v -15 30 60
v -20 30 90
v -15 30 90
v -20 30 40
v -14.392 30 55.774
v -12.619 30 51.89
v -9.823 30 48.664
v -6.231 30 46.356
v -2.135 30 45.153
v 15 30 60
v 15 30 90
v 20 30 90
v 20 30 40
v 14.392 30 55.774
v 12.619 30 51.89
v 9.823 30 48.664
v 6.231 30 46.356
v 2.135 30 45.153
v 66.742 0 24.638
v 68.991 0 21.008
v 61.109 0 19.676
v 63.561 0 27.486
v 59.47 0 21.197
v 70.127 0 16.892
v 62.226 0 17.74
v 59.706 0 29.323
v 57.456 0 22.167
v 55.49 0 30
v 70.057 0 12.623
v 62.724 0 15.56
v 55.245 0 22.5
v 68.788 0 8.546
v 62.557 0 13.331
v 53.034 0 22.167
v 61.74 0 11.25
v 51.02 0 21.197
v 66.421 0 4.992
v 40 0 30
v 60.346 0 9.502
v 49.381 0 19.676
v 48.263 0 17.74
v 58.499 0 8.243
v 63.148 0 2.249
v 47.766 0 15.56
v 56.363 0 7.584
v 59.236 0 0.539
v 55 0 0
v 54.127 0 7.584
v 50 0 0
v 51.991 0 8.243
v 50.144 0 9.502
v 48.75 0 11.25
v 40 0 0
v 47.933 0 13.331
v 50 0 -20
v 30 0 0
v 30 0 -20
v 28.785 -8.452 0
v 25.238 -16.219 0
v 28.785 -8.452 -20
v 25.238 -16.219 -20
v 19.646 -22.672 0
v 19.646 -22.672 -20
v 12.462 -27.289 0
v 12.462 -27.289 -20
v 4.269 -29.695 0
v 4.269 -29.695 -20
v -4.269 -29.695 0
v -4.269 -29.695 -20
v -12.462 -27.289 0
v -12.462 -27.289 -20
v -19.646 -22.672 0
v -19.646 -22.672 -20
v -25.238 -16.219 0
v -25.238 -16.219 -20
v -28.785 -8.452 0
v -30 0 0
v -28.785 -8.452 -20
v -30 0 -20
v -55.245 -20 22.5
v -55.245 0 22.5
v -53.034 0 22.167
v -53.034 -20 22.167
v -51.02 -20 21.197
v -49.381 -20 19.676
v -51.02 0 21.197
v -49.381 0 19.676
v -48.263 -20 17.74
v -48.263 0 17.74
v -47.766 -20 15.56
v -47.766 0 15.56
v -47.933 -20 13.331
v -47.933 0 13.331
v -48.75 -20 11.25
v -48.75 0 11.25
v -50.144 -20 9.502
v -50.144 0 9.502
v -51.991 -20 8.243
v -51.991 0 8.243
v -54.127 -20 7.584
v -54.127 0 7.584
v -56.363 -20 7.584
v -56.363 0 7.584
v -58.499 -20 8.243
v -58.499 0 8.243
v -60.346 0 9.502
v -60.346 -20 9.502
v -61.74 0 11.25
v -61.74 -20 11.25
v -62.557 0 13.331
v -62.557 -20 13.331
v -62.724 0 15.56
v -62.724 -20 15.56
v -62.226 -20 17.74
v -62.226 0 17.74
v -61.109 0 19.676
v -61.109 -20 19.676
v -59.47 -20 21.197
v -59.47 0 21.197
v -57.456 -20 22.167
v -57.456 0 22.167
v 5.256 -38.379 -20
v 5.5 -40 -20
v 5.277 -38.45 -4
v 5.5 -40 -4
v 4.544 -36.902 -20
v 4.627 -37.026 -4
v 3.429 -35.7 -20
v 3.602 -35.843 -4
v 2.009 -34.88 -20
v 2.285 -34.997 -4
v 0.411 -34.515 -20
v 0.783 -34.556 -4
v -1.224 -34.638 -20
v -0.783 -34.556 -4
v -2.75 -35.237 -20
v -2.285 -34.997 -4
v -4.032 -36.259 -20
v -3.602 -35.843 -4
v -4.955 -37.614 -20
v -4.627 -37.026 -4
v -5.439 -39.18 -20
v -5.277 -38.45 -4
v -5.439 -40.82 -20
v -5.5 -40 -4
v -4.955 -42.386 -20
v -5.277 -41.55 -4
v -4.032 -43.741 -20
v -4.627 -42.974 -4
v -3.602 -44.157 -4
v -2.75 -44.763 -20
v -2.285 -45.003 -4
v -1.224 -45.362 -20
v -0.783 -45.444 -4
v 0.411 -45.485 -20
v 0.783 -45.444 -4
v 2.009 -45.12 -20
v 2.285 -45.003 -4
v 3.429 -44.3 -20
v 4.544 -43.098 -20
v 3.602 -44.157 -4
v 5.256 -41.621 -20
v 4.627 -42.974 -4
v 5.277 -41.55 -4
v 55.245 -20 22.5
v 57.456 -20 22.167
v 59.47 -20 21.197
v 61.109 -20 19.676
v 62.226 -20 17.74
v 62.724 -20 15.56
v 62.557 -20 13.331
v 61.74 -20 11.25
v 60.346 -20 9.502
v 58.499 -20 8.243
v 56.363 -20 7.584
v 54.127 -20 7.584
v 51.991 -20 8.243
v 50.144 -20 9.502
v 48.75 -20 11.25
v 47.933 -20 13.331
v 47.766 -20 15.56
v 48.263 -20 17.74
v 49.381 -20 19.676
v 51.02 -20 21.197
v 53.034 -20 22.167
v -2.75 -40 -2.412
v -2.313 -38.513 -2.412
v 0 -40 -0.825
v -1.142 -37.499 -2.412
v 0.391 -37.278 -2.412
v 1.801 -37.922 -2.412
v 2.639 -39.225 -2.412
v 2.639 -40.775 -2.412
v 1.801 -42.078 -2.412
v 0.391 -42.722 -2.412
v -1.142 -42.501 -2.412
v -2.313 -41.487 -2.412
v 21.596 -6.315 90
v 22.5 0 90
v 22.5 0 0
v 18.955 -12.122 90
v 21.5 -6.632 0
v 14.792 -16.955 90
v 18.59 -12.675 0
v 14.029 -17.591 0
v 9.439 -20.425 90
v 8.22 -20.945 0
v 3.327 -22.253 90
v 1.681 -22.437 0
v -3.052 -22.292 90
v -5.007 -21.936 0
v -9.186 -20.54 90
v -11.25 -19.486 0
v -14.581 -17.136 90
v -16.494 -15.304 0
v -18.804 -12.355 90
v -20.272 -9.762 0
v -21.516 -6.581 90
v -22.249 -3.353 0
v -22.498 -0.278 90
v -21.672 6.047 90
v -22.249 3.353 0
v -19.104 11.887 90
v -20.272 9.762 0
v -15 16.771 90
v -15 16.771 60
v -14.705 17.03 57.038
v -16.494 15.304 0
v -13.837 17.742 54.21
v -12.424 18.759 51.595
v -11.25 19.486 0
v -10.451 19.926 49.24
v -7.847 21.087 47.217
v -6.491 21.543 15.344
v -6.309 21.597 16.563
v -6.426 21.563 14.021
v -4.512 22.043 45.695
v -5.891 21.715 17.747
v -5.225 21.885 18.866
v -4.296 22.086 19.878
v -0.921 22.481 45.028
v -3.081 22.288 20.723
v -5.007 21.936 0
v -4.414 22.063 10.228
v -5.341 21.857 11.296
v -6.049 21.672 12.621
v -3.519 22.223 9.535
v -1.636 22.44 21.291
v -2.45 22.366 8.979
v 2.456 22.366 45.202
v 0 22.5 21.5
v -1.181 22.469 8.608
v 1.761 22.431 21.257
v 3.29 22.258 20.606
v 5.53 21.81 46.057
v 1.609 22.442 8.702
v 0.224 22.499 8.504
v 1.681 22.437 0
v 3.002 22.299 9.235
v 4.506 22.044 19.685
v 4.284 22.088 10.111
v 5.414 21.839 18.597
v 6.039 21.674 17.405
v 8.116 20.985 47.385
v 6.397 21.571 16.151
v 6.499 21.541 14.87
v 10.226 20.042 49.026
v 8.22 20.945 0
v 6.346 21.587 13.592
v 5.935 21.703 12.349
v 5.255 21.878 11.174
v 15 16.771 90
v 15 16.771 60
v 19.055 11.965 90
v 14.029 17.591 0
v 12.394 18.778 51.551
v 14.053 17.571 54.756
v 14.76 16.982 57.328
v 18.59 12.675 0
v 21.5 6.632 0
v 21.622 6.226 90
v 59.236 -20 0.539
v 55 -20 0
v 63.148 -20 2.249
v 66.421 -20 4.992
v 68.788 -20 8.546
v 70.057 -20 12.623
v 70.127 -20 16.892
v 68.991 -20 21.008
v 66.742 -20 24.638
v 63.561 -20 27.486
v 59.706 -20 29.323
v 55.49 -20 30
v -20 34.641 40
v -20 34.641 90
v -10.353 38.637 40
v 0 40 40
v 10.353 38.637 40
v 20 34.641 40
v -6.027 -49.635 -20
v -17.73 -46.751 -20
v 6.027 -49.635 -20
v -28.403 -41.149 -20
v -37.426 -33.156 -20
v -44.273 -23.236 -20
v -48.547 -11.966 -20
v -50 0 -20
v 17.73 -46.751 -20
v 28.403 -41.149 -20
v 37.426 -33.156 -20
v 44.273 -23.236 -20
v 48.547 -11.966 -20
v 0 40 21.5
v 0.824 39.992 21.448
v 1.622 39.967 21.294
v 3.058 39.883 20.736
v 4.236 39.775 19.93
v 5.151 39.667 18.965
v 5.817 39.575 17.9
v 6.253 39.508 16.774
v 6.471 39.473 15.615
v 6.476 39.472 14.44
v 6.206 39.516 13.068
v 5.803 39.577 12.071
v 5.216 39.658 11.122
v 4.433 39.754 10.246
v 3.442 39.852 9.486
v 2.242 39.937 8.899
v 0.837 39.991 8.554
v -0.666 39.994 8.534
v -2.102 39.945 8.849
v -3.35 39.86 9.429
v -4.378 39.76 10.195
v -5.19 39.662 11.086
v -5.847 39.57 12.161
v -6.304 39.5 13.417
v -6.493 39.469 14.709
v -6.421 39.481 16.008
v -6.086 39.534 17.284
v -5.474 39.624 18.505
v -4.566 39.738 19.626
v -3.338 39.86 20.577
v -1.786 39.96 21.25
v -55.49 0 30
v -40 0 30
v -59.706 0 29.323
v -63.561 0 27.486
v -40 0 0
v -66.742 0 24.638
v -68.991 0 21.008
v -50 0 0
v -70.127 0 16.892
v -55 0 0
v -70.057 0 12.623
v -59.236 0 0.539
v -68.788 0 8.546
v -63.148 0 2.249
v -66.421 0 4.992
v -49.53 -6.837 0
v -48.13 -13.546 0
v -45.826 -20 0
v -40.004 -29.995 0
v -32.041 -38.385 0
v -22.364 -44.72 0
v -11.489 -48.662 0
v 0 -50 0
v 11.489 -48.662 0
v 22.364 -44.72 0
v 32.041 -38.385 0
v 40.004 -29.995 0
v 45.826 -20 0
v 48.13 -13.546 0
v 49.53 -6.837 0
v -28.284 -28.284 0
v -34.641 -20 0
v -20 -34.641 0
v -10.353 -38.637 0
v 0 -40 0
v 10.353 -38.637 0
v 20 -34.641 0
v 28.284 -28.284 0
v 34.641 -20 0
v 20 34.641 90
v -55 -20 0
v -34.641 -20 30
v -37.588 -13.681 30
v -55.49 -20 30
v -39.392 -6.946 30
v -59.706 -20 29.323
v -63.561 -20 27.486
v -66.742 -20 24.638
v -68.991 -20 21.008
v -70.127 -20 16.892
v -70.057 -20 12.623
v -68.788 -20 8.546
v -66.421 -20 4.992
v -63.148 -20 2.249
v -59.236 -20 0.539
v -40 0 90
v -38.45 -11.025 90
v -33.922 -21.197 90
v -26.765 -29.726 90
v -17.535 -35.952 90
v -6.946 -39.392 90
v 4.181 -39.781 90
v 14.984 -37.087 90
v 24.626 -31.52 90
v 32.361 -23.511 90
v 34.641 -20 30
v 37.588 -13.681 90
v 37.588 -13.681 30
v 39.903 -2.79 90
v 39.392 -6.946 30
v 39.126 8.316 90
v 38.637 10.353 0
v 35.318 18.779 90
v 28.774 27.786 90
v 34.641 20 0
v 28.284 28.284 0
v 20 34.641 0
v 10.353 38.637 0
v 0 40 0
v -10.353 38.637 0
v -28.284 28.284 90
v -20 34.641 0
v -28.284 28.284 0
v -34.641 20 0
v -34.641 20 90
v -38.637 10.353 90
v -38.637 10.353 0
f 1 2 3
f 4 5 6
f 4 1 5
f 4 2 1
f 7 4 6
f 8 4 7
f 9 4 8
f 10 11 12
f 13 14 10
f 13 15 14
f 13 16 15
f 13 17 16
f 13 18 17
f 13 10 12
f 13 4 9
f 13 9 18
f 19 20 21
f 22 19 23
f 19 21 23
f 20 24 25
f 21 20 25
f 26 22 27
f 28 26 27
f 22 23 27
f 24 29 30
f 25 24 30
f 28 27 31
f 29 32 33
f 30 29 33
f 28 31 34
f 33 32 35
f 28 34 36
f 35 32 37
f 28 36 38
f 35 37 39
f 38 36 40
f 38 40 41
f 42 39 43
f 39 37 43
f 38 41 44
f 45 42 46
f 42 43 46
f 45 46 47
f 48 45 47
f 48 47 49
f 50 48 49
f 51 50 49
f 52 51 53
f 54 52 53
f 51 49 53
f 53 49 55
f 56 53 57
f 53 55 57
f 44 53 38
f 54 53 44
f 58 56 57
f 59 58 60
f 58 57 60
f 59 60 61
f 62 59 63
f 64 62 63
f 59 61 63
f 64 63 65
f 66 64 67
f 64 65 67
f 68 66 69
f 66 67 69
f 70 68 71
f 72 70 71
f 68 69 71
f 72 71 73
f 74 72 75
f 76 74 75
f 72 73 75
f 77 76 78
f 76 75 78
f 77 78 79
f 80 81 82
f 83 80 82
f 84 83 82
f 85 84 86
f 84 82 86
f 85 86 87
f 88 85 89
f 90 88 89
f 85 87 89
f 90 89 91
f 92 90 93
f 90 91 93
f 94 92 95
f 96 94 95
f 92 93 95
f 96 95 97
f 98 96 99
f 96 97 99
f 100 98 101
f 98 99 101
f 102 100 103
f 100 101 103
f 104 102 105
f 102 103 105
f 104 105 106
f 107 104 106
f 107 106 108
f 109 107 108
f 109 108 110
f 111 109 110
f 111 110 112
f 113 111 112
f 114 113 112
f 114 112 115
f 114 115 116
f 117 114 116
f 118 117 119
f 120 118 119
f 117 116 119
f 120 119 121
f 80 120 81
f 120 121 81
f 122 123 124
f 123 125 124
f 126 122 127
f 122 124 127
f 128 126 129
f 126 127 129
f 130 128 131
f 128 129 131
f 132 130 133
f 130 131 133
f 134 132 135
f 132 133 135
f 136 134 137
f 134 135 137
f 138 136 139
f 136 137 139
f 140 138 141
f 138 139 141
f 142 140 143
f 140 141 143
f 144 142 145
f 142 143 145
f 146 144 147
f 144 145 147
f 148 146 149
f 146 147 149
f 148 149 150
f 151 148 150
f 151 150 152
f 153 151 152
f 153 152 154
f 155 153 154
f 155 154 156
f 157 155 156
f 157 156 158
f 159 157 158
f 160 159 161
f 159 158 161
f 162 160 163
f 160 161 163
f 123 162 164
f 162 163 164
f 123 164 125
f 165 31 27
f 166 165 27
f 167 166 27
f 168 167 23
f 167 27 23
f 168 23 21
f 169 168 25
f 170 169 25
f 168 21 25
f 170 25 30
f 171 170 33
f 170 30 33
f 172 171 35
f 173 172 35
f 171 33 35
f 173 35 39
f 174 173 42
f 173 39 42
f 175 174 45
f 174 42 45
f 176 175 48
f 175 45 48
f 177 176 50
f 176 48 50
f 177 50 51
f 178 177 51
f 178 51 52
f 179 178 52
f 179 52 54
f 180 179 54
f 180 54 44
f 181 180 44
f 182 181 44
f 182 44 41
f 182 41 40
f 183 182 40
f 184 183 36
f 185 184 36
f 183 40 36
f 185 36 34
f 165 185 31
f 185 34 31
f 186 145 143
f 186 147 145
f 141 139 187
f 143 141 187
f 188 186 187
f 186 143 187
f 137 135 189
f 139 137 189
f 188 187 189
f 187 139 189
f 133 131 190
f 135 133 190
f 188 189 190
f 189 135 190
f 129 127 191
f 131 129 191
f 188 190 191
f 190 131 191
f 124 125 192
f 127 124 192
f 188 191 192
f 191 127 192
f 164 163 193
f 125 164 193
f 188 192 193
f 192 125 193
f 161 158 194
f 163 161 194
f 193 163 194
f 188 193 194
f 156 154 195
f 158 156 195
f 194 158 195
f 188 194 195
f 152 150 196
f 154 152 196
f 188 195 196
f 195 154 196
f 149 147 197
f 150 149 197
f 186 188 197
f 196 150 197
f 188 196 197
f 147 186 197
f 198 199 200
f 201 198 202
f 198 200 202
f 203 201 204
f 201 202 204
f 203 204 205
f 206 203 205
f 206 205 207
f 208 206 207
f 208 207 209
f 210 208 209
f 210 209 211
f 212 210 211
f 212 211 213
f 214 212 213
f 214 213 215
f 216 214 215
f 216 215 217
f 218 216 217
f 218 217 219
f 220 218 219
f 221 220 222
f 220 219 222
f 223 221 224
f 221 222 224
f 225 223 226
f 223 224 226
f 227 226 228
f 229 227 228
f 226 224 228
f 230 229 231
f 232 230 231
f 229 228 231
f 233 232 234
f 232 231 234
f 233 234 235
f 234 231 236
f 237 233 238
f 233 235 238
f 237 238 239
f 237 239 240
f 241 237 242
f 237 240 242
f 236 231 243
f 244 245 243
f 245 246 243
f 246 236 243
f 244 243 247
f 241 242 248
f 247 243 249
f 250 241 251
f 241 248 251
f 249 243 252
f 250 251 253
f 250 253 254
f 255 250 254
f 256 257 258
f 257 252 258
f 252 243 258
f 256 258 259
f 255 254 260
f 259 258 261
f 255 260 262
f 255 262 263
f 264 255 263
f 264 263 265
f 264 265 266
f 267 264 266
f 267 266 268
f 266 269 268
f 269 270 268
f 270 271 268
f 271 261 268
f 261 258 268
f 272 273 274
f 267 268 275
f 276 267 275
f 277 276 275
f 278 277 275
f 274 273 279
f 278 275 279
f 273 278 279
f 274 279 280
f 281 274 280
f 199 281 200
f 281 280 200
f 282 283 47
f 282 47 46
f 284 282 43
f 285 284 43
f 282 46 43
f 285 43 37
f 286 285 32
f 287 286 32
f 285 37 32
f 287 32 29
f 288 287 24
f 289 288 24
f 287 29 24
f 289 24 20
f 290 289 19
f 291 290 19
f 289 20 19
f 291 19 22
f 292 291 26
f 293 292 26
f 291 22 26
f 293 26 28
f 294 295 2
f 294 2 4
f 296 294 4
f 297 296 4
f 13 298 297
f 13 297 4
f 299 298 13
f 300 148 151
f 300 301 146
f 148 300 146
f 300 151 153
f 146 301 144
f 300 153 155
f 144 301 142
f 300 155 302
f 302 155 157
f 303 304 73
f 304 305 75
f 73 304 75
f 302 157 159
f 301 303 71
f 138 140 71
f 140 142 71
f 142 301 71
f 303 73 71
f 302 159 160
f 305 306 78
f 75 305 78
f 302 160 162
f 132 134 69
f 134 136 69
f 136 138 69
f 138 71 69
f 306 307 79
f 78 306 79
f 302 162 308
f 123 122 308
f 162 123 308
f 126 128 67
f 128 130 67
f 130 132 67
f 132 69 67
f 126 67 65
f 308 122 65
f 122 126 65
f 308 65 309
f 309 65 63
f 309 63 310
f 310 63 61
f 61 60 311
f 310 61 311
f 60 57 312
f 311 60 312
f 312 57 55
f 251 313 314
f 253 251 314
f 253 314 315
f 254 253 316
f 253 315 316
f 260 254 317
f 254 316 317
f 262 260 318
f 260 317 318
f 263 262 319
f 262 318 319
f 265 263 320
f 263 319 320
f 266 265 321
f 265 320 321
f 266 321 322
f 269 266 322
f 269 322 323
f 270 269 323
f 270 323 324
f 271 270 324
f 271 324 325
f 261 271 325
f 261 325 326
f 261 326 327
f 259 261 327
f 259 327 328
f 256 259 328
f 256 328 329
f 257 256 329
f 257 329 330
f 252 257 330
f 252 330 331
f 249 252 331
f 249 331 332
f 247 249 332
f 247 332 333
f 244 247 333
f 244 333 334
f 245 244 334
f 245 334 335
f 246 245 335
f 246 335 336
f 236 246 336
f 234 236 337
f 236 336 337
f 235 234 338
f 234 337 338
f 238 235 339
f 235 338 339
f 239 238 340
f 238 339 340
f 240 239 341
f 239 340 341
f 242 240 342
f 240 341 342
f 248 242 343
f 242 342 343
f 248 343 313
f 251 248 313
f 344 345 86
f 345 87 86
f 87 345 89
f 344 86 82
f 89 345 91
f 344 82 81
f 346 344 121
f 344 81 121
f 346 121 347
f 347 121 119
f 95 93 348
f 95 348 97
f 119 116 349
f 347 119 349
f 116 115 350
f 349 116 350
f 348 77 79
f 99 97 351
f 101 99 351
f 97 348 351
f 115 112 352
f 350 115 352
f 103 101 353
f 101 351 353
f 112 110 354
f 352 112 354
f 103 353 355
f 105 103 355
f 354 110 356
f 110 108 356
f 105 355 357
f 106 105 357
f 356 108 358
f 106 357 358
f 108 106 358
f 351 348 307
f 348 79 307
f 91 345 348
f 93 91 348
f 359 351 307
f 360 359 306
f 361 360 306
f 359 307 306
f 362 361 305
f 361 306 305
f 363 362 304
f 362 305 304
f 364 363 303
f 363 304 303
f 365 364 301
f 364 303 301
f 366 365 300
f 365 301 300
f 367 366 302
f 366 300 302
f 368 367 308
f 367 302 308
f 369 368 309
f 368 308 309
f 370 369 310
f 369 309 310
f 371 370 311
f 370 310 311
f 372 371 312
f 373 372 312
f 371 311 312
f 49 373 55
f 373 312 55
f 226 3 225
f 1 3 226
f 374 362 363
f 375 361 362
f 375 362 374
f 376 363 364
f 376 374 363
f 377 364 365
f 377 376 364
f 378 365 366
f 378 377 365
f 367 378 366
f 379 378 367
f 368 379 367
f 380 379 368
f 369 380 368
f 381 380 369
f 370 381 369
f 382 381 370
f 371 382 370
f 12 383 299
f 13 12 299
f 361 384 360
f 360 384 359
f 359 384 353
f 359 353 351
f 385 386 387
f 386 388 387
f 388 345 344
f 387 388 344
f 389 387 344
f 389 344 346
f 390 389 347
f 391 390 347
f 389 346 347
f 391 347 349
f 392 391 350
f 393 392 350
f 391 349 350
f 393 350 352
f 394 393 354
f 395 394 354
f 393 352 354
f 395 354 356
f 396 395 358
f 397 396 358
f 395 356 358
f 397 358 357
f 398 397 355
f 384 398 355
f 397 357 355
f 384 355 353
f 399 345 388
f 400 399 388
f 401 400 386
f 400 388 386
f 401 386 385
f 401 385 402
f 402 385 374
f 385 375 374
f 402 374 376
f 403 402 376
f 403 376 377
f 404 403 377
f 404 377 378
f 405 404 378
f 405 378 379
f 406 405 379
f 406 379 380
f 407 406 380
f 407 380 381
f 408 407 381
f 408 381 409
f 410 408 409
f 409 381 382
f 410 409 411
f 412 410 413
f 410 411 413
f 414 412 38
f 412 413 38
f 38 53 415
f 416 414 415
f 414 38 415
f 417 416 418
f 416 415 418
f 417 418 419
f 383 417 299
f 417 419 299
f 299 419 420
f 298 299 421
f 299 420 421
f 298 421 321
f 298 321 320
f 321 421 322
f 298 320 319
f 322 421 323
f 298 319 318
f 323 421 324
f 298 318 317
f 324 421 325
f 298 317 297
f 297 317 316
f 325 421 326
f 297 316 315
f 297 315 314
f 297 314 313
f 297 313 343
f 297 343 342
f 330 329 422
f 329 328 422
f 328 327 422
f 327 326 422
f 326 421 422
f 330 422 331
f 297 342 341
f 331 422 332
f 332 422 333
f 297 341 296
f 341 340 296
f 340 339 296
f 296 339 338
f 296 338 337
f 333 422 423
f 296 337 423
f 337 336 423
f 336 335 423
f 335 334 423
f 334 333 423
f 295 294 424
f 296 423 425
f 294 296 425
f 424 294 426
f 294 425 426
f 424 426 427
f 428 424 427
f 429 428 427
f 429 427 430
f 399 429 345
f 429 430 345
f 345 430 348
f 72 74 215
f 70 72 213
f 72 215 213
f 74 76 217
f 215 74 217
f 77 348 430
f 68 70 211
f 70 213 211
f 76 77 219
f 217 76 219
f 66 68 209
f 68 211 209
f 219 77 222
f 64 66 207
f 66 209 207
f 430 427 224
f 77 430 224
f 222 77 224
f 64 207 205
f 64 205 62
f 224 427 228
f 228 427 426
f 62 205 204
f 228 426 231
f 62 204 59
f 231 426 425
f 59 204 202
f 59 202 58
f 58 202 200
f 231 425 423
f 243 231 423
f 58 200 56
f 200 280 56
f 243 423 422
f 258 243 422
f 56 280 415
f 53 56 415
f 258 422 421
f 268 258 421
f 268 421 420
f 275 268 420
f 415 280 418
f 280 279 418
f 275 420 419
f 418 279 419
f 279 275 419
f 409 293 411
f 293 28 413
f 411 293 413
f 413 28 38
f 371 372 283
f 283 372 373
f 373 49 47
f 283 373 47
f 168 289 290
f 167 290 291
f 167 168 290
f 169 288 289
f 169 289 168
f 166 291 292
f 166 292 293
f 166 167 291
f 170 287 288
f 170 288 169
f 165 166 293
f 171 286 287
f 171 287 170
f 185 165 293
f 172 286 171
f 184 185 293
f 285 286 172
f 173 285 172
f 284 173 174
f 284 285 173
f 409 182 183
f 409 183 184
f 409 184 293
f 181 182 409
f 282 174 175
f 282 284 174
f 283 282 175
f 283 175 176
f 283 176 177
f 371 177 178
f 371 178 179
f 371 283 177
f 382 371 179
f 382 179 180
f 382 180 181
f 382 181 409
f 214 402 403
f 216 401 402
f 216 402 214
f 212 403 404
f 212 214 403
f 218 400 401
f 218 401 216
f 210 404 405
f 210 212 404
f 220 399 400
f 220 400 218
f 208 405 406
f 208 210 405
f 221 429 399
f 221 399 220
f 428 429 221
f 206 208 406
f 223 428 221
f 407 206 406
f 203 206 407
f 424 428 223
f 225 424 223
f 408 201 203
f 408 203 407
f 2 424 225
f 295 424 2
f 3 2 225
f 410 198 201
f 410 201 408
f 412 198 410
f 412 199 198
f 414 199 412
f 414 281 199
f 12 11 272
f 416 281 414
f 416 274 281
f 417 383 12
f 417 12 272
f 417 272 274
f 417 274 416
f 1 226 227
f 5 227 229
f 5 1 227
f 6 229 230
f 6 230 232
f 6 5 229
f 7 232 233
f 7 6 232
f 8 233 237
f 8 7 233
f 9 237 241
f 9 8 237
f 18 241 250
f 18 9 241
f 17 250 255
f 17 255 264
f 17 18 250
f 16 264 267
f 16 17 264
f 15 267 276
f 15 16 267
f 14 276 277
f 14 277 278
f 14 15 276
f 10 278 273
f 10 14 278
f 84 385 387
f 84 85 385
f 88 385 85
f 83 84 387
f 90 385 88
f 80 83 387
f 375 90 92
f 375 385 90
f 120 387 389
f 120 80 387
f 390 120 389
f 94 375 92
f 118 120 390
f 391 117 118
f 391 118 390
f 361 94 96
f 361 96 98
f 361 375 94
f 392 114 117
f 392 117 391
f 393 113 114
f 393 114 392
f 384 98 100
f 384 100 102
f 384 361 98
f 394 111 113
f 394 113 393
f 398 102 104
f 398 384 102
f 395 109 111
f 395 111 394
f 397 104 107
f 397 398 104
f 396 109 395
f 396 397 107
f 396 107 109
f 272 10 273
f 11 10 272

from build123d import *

# Parameters (mm, degrees)
SKETCH1_R                 = 40
SKETCH1_R_2               = 22.5
BOSS_EXTRUDE1_DEPTH       = 90
BOSS_EXTRUDE2_DEPTH       = 20
SKETCH3_R                 = 7.5
BOSS_EXTRUDE9_DEPTH       = 20
CUT_EXTRUDE1_REACH        = 147.378
CUT_EXTRUDE1_END_RADIUS   = 22.5
SKETCH5_R                 = 6.5
SKETCH5_3_W               = 40
SKETCH5_3_H               = 100
CUT_EXTRUDE2_DEPTH        = 10
F_2_0MM_DOWEL_HOLE1_D     = 11
F_2_0MM_DOWEL_HOLE1_DEPTH = 16
F_2_0MM_DOWEL_HOLE1_TIP   = 3.175426481


with BuildPart() as part:
    # Sketch1 → Boss-Extrude1 (new body)
    with BuildSketch(Plane.XY):
        Circle(SKETCH1_R)
        Circle(SKETCH1_R_2, mode=Mode.SUBTRACT)
    extrude(amount=BOSS_EXTRUDE1_DEPTH)

    # Sketch1<3> → Boss-Extrude2 (add)
    with BuildSketch(Plane.XY):
        with BuildLine():
            ThreePointArc((-50, 0), (0, -50), (50, 0))
            Line((50, 0), (30, 0))
            ThreePointArc((30, 0), (0, -30), (-30, 0))
            Line((-30, 0), (-50, 0))
        make_face()
    extrude(amount=-BOSS_EXTRUDE2_DEPTH)

    # Sketch3 → Boss-Extrude9 (add)
    # profile 1 of 2: a face of its own
    with BuildSketch(Plane(origin=(0, 0, 0), x_dir=(1, 0, 0), z_dir=(0, 1, 0))):
        with BuildLine():
            Line((34.445197512, 0), (55, 0))
            ThreePointArc((55, 0), (70.244929467, -14.755070533), (55.489858934, -30))
            Line((55.489858934, -30), (34.445197512, -30))
            Line((34.445197512, -30), (34.445197512, 0))
        make_face()
        with Locations((55.244929467, -15)):
            Circle(SKETCH3_R, mode=Mode.SUBTRACT)
    # profile 2 of 2: a face of its own
    with BuildSketch(Plane(origin=(0, 0, 0), x_dir=(1, 0, 0), z_dir=(0, 1, 0))):
        with BuildLine():
            Line((-34.445197512, 0), (-34.445197512, -30))
            Line((-34.445197512, -30), (-55.489858934, -30))
            ThreePointArc((-55.489858934, -30), (-70.244929467, -14.755070533), (-55, 0))
            Line((-55, 0), (-34.445197512, 0))
        make_face()
        with Locations((-55.244929467, -15)):
            Circle(SKETCH3_R, mode=Mode.SUBTRACT)
    extrude(amount=-BOSS_EXTRUDE9_DEPTH)

    # Cut-Extrude1: up to this cylinder (the profile starts outside it)
    cut_extrude1_end = Plane(origin=(0, 0, 41.9876885), z_dir=(0, 0, -1)) * Cylinder(CUT_EXTRUDE1_END_RADIUS, 394.731377, mode=Mode.PRIVATE)
    # Sketch5 → Cut-Extrude1 (cut, up to the surface)
    with BuildSketch(Plane(origin=(0, 40, 0), x_dir=(1, 0, 0), z_dir=(0, 1, 0)), mode=Mode.PRIVATE) as cut_extrude1_sk1:
        with BuildLine():
            ThreePointArc((15, -60), (0, -45), (-15, -60))
            Line((-15, -60), (-15, -90))
            Line((-15, -90), (15, -90))
            Line((15, -90), (15, -60))
        make_face()
    cut_extrude1_tool1 = extrude(cut_extrude1_sk1.sketch, amount=-CUT_EXTRUDE1_REACH, mode=Mode.PRIVATE) - cut_extrude1_end
    add(cut_extrude1_tool1.solids().sort_by_distance((0, 40, 68.975377))[0], mode=Mode.SUBTRACT)
    # Sketch5 → Cut-Extrude1 (cut, up to the surface)
    with BuildSketch(Plane(origin=(0, 40, 0), x_dir=(1, 0, 0), z_dir=(0, 1, 0)), mode=Mode.PRIVATE) as cut_extrude1_sk2:
        with Locations((0, -15)):
            Circle(SKETCH5_R)
    cut_extrude1_tool2 = extrude(cut_extrude1_sk2.sketch, amount=-CUT_EXTRUDE1_REACH, mode=Mode.PRIVATE) - cut_extrude1_end
    add(cut_extrude1_tool2.solids().sort_by_distance((0, 40, 15))[0], mode=Mode.SUBTRACT)

    # Sketch5<3> → Cut-Extrude2 (cut)
    with BuildSketch(Plane(origin=(0, 40, 0), x_dir=(1, 0, 0), z_dir=(0, 1, 0))):
        with Locations((0, -90)):
            Rectangle(SKETCH5_3_W, SKETCH5_3_H)
        with BuildLine():
            Line((-15, -90), (-15, -60))
            ThreePointArc((-15, -60), (0, -45), (15, -60))
            Line((15, -60), (15, -90))
            Line((15, -90), (-15, -90))
        make_face(mode=Mode.SUBTRACT)
    extrude(amount=-CUT_EXTRUDE2_DEPTH, mode=Mode.SUBTRACT)

    # Ø2.0mm Dowel Hole1
    with Locations(Plane(origin=(0, 0, -20), x_dir=(-1, 0, 0), z_dir=(0, 0, -1))):
        with Locations((0, -40)):
            Hole(F_2_0MM_DOWEL_HOLE1_D / 2, depth=F_2_0MM_DOWEL_HOLE1_DEPTH)
            with Locations((0, 0, -(F_2_0MM_DOWEL_HOLE1_DEPTH + F_2_0MM_DOWEL_HOLE1_TIP / 2))):  # 120° drill point
                Cone(0, F_2_0MM_DOWEL_HOLE1_D / 2, F_2_0MM_DOWEL_HOLE1_TIP, mode=Mode.SUBTRACT)


solid = part.part
